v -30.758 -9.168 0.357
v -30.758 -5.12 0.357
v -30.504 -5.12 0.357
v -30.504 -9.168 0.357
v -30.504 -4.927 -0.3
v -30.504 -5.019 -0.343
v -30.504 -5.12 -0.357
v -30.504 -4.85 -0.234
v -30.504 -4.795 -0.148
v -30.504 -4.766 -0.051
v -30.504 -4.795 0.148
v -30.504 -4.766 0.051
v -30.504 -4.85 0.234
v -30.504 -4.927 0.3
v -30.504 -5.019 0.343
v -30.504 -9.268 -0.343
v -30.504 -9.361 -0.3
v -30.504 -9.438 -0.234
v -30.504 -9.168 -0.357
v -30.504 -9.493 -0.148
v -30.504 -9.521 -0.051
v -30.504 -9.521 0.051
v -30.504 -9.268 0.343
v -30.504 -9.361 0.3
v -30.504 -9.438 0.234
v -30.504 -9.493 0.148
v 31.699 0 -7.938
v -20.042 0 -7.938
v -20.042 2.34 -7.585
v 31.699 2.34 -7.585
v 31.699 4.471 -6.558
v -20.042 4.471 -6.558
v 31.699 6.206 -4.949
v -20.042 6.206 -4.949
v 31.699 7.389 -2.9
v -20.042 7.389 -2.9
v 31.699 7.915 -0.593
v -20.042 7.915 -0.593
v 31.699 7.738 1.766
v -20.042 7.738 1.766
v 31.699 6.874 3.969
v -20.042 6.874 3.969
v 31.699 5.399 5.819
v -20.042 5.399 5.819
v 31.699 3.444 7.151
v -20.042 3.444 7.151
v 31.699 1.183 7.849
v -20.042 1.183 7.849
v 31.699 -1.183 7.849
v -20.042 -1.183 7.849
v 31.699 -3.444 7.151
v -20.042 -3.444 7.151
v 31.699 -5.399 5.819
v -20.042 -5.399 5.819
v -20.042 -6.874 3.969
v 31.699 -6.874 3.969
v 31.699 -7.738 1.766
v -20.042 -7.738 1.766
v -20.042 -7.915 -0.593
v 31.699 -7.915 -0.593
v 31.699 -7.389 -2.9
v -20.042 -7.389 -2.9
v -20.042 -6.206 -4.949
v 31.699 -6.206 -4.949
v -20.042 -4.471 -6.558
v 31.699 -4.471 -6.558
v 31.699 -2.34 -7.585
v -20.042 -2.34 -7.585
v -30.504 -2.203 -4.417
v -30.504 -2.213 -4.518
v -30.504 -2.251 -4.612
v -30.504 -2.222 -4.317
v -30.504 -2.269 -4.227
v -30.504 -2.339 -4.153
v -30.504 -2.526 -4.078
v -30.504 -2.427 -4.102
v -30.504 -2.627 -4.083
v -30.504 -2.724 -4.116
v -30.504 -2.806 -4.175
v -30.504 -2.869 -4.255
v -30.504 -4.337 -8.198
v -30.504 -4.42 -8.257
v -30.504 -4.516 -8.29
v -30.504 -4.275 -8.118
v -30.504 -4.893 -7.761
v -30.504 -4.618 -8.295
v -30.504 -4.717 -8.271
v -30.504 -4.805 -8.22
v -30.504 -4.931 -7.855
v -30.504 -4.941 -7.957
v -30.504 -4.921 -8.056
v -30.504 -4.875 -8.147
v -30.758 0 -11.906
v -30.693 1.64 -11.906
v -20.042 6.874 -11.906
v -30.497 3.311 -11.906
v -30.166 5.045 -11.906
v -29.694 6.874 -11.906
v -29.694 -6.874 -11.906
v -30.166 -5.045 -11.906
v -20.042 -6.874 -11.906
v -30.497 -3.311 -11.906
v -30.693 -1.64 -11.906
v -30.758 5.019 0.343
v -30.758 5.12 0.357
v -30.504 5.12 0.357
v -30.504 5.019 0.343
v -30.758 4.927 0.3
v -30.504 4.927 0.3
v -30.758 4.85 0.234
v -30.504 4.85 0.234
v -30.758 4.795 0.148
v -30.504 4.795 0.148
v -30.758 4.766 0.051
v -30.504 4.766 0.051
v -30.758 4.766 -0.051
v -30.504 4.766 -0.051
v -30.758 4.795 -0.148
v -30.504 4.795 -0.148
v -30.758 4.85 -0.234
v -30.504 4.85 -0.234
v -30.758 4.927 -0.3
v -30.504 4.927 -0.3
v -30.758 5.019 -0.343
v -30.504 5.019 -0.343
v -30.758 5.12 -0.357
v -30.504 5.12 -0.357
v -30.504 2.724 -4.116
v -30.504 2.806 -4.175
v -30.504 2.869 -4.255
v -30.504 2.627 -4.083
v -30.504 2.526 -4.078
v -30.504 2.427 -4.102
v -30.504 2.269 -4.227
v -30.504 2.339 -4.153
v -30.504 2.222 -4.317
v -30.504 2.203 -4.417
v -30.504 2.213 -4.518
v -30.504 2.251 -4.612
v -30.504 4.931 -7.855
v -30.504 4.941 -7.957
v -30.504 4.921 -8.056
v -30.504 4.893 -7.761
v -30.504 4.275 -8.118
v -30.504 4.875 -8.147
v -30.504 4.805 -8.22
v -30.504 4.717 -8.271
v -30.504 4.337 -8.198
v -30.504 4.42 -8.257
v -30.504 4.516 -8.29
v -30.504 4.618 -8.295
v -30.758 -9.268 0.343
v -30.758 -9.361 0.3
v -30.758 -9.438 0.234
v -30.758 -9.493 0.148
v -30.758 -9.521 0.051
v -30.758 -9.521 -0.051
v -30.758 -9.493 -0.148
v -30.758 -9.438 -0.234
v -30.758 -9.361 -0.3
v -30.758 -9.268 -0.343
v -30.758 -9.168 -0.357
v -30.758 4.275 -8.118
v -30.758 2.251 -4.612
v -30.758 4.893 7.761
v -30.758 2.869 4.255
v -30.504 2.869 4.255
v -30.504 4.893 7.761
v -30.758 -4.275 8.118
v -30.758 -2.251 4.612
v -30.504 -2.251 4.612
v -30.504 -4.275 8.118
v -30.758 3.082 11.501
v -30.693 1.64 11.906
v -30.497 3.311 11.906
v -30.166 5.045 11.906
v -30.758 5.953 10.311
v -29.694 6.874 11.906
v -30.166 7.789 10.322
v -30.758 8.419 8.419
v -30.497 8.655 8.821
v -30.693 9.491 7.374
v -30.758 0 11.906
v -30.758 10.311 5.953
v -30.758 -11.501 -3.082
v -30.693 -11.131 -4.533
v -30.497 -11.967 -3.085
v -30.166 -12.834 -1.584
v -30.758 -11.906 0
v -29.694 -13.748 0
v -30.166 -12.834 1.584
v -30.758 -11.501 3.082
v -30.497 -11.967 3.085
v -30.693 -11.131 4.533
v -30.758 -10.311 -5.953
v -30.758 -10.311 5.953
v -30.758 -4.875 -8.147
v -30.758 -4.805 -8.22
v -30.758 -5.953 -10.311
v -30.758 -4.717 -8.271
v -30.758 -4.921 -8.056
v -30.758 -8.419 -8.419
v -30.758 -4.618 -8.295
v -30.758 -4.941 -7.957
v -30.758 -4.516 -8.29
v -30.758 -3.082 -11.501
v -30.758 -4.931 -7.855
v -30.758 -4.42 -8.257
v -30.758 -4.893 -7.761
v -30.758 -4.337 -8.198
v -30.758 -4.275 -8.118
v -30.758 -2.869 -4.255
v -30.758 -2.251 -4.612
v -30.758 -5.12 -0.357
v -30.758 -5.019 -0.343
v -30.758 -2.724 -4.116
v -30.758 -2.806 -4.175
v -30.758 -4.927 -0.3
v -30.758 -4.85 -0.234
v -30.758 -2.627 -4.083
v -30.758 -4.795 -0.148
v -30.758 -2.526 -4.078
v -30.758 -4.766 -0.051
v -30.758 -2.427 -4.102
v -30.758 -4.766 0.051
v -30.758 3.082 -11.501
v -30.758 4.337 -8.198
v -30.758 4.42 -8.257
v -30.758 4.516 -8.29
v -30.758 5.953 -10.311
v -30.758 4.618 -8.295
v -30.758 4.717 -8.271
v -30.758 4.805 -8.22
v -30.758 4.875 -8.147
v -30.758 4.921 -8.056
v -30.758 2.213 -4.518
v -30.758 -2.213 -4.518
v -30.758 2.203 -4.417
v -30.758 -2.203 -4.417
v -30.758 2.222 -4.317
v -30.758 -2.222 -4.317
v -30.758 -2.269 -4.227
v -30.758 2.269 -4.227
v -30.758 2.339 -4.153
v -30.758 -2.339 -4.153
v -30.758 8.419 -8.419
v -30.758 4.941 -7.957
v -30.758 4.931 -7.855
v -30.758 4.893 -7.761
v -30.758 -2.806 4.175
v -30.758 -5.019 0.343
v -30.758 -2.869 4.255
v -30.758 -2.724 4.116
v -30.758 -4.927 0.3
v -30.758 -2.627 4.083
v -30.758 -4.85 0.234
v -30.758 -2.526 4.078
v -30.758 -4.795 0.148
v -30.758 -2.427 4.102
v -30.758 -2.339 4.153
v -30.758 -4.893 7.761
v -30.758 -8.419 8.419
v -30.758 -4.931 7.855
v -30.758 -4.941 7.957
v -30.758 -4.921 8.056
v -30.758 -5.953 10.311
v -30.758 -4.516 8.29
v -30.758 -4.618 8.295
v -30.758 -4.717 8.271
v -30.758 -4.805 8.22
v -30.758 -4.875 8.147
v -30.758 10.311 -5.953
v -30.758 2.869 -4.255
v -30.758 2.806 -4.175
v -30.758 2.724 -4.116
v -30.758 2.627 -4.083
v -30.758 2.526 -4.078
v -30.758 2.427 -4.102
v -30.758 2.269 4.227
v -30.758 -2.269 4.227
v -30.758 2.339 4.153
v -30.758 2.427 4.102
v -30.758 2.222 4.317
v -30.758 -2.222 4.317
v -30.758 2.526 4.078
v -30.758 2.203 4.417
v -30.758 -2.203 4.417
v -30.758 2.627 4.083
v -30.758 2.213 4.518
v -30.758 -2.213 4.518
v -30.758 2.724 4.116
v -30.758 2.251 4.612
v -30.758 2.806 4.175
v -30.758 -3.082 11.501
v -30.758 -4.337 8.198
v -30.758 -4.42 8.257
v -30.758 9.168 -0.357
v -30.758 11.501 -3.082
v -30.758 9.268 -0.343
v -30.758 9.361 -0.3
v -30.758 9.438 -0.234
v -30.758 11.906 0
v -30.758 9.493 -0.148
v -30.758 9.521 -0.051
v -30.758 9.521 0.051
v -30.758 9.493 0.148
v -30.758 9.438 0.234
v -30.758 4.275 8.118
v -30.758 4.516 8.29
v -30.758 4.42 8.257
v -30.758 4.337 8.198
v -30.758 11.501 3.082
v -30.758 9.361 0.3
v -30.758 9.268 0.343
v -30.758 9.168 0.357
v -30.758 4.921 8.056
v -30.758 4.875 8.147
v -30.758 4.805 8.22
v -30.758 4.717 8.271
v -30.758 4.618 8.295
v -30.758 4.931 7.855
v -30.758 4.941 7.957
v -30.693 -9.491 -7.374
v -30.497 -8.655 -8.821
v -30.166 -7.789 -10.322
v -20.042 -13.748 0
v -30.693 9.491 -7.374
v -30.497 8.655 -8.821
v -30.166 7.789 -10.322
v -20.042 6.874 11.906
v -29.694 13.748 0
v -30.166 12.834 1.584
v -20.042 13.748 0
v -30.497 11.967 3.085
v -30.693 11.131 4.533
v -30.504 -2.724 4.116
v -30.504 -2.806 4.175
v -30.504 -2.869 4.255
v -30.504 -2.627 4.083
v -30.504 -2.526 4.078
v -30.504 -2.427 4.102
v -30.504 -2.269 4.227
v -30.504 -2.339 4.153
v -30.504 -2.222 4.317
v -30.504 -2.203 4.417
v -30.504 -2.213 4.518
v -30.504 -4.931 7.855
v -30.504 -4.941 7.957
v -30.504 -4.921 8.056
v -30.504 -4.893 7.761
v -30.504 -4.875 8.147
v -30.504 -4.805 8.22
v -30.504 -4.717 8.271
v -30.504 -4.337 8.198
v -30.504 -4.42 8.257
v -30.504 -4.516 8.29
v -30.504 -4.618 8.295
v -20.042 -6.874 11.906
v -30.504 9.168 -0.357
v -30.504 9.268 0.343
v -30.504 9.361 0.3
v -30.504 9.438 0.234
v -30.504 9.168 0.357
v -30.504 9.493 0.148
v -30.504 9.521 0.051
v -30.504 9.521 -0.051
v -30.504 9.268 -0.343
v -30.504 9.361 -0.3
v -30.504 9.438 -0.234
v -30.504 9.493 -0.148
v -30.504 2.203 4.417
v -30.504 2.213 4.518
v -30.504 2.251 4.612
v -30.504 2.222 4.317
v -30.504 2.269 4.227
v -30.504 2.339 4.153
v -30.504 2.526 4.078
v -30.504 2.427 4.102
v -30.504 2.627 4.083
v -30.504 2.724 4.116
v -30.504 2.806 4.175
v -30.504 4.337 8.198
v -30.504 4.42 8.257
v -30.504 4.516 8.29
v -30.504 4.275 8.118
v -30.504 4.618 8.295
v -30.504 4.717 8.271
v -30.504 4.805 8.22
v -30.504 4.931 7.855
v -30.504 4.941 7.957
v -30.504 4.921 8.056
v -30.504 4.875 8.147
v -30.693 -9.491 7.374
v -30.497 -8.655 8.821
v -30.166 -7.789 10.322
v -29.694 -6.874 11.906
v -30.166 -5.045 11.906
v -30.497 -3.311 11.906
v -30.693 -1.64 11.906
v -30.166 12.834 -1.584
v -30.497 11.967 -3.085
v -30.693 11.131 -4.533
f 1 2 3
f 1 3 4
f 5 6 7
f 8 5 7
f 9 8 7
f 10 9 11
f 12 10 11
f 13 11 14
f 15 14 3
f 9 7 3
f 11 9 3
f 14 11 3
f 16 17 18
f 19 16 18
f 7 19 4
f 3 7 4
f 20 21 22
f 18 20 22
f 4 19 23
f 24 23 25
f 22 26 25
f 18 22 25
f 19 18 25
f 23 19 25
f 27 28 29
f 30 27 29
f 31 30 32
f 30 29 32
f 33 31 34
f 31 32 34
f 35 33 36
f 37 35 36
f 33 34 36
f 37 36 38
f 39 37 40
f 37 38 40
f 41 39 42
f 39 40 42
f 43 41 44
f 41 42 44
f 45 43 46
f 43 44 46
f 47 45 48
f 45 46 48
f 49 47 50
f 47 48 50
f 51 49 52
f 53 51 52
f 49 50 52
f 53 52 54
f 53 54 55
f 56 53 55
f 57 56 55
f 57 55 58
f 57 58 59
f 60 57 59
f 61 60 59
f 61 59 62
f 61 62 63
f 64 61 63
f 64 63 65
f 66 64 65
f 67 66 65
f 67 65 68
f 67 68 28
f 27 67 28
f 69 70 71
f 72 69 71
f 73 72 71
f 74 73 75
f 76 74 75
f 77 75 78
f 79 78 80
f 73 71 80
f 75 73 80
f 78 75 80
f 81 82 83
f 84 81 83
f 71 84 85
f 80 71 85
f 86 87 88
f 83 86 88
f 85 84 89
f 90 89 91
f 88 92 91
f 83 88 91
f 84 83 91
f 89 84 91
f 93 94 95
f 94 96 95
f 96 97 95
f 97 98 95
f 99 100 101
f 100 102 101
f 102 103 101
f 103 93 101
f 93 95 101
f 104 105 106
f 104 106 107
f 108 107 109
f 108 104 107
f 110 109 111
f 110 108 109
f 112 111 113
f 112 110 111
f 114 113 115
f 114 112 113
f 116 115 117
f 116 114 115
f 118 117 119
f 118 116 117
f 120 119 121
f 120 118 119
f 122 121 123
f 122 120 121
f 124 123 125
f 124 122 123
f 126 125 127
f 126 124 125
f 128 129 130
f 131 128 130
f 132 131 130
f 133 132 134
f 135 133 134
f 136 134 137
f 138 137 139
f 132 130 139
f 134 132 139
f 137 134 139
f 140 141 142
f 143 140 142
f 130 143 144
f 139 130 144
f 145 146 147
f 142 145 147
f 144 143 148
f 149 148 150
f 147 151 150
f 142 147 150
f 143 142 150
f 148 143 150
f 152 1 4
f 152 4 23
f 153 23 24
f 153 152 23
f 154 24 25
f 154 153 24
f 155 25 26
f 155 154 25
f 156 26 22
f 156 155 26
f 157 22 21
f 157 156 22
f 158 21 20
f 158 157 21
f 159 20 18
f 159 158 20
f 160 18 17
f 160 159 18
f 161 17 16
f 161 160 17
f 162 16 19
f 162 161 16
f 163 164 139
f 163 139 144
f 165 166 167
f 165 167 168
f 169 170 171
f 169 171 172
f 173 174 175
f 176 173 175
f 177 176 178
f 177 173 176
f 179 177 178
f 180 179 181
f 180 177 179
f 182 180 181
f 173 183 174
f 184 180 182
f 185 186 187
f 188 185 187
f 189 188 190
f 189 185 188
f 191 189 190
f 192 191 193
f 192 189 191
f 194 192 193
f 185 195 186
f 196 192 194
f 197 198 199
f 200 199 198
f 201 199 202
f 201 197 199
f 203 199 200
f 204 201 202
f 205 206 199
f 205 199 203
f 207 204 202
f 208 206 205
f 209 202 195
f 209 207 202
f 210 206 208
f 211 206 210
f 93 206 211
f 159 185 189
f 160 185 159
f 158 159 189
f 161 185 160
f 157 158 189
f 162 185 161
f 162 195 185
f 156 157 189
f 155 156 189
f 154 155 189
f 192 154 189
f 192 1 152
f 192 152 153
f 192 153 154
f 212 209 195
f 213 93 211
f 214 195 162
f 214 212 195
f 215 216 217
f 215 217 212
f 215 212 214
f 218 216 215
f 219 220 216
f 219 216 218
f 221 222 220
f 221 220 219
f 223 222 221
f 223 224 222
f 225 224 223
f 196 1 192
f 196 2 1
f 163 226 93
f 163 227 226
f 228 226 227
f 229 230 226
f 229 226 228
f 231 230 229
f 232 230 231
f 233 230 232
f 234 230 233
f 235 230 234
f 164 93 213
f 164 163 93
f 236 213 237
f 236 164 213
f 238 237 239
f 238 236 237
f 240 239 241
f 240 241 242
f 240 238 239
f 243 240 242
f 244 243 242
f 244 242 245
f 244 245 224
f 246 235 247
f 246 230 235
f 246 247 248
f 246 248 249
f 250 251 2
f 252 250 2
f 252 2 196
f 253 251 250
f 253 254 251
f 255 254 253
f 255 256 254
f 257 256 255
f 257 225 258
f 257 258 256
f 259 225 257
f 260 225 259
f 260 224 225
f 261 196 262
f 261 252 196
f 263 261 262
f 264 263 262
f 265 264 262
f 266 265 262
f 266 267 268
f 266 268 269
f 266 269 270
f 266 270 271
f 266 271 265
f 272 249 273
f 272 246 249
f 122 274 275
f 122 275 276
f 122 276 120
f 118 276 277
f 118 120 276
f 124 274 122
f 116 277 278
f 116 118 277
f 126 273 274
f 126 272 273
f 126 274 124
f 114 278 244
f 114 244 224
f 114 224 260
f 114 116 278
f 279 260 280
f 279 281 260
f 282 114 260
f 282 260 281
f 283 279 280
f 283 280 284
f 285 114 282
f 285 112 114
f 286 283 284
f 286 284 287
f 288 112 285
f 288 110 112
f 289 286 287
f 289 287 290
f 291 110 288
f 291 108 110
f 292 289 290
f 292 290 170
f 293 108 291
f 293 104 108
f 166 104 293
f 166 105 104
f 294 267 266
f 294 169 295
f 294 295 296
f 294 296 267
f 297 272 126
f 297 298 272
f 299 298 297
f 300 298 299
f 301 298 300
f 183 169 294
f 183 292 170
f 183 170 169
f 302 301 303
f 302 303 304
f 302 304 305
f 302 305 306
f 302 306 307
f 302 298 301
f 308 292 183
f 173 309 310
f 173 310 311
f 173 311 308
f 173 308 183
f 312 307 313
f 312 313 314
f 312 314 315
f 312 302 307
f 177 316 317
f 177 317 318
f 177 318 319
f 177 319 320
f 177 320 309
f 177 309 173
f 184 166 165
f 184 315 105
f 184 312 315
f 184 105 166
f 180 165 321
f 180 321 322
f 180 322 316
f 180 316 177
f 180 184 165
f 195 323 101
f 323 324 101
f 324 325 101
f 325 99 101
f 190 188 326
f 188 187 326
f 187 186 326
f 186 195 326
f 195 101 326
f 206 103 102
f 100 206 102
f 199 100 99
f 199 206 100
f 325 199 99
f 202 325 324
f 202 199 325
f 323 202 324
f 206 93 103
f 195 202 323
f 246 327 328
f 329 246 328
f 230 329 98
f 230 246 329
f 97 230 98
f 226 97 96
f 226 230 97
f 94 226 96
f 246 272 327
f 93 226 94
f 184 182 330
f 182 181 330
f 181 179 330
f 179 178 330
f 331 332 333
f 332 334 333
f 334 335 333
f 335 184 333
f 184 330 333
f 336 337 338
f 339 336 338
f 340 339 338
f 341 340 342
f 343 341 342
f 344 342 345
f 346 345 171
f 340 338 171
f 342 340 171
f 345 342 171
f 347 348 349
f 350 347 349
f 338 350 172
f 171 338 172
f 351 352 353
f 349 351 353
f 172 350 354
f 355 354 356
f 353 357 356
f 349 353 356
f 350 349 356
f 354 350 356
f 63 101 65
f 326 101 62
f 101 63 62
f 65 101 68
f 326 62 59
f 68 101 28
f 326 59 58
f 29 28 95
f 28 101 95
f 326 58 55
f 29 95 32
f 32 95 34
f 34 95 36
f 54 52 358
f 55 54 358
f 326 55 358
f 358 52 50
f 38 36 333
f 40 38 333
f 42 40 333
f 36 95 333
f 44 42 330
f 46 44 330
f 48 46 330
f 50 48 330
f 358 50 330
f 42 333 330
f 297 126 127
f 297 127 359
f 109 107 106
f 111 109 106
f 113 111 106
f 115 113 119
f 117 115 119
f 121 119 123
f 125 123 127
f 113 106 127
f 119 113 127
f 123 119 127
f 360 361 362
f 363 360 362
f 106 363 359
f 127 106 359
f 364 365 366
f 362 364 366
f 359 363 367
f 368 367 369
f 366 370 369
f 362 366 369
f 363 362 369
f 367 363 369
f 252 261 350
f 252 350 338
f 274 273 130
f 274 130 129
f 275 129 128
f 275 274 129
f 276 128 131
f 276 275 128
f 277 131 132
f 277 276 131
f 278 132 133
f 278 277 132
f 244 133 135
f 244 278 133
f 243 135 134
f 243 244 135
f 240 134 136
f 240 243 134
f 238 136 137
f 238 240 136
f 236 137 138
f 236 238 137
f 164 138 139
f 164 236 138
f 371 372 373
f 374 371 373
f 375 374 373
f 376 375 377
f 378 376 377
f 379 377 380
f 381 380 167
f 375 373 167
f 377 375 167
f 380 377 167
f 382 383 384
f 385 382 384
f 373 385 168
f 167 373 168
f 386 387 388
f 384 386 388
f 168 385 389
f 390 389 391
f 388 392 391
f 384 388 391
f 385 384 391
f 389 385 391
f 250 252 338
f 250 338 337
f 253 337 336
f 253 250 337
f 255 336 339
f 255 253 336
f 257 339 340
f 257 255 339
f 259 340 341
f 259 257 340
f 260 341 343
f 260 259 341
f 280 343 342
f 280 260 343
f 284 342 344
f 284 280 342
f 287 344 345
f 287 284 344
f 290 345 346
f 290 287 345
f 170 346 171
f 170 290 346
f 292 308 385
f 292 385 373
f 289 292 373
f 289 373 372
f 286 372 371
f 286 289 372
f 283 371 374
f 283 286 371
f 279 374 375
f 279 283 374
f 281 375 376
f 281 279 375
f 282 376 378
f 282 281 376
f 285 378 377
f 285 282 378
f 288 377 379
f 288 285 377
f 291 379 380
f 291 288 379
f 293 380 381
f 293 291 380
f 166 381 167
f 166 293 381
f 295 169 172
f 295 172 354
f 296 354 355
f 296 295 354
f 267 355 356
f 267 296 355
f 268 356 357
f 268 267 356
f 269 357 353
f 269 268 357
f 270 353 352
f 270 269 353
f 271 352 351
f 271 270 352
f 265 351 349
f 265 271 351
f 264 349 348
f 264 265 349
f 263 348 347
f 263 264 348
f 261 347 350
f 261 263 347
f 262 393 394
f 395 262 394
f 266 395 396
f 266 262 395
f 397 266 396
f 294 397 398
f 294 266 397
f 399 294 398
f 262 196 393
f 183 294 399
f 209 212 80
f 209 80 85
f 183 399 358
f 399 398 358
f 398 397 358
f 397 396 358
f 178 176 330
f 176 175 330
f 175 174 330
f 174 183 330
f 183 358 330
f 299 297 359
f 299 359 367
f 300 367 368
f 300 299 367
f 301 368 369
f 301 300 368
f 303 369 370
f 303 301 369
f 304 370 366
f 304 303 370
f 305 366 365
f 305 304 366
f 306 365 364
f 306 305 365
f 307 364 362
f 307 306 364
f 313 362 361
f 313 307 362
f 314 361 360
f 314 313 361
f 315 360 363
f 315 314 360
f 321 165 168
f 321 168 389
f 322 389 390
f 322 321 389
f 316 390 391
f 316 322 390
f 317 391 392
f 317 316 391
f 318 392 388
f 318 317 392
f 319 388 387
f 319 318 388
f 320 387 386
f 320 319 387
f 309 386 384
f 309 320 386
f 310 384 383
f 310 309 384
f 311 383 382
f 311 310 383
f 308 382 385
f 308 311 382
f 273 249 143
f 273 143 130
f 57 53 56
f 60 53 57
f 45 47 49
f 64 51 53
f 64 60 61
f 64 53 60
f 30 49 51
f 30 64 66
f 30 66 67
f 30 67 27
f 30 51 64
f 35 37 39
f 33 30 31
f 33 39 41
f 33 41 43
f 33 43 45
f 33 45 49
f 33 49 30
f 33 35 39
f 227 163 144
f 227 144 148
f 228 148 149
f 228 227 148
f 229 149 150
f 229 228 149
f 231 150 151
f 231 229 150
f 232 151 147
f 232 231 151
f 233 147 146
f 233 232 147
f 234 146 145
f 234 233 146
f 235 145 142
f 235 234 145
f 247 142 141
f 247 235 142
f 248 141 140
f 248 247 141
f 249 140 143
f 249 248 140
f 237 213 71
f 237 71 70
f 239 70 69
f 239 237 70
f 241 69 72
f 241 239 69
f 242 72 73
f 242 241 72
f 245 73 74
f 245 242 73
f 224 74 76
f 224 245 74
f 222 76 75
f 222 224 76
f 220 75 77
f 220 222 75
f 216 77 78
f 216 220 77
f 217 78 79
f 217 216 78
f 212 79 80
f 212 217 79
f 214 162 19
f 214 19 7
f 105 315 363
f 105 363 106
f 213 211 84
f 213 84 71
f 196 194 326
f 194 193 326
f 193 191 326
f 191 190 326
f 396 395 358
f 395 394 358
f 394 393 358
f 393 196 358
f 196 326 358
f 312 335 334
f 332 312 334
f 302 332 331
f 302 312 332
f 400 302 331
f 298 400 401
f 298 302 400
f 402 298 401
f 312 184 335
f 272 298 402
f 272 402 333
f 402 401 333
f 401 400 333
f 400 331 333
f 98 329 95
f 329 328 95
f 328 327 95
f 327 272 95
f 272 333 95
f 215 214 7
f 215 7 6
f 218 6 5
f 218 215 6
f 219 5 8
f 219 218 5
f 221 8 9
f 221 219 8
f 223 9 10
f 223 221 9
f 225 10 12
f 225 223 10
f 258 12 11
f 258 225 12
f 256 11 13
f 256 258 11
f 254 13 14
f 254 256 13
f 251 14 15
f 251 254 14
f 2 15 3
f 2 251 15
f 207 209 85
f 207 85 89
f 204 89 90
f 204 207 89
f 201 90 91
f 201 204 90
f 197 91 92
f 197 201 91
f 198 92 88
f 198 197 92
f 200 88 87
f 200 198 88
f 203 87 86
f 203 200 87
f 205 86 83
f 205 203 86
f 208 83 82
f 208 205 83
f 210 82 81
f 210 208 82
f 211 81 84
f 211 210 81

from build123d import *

# Parameters (mm, degrees)
SKETCH5_R           = 7.9375
BOSS_EXTRUDE3_DEPTH = 50.8
CHAMFER1_SIZE       = 1.731818182
CUT_SWEEP1_PITCH    = 2.309090909
BOSS_EXTRUDE4_DEPTH = 10.715625
SKETCH8_OUTSIDE_W   = 265.784
SKETCH8_OUTSIDE_H   = 269.468
SKETCH8_OUTSIDE_R   = 11.90625
CUT_EXTRUDE3_DEPTH  = 65.147818703
CUT_EXTRUDE3_DRAFT  = -60
CUT_EXTRUDE4_DEPTH  = 0.254
CIRPATTERN1_COUNT   = 6
SKETCH13_R          = 7.9375
BOSS_EXTRUDE5_DEPTH = 51.741567


with BuildPart() as part:
    # Sketch5 → Boss-Extrude3 (new body)
    with BuildSketch(Plane(origin=(30.7578125, 0, 0), x_dir=(0, 0, -1), z_dir=(1, 0, 0))):
        Circle(SKETCH5_R)
    extrude(amount=-BOSS_EXTRUDE3_DEPTH)

    # Chamfer1
    chamfer1_edges = [part.edges().sort_by_distance(p)[0] for p in [
        (30.7578125, 0, 7.9375),
    ]]
    chamfer(chamfer1_edges, length=CHAMFER1_SIZE)

    # Cut-Sweep1: arcs per turn and ends read off the stored shape
    # Cut-Sweep1: the profile of Sketch10 profile screwed along a right-hand helix through 23 turns, 10 arcs to a turn; built about Z, then put on its axis
    cut_sweep1_z = Axis((0, 0, 0), (0, 0, 1))
    cut_sweep1_corners = [(7.9378, 0, 0.000173205), (6.43770146, 0, -0.865909091), (6.43770146, 0, -1.154545455), (7.9378, 0, -2.020627751)]
    with BuildLine(mode=Mode.PRIVATE) as cut_sweep1_profile:
        Line(cut_sweep1_corners[0], cut_sweep1_corners[1])
        Line(cut_sweep1_corners[1], cut_sweep1_corners[2])
        Line(cut_sweep1_corners[2], cut_sweep1_corners[3])
        Line(cut_sweep1_corners[3], cut_sweep1_corners[0])
    cut_sweep1_cap = Face(cut_sweep1_profile.wire())
    cut_sweep1_turn_angles = [0, 18, 36, 54, 72, 90, 108, 126, 144, 162, 180, 198, 216, 234, 252, 270, 288, 306, 324, 342, 360]
    cut_sweep1_turn_weights = [1, 0.9510565162951535, 1, 0.9510565162951535, 1, 0.9510565162951535, 1, 0.9510565162951535, 1, 0.9510565162951535, 1, 0.9510565162951535, 1, 0.9510565162951535, 1, 0.9510565162951535, 1, 0.9510565162951535, 1, 0.9510565162951535, 1]
    cut_sweep1_turn_rails = [Edge.make_bspline([Vector(p[0], p[1], 0).rotate(cut_sweep1_z, cut_sweep1_turn_angles[k]) / cut_sweep1_turn_weights[k] + Vector(0, 0, p[2] + CUT_SWEEP1_PITCH * cut_sweep1_turn_angles[k] / 360) for k in range(21)], [0, 0, 0, 1, 1, 2, 2, 3, 3, 4, 4, 5, 5, 6, 6, 7, 7, 8, 8, 9, 9, 10, 10, 10], 2, cut_sweep1_turn_weights) for p in cut_sweep1_corners]
    cut_sweep1_turn_sides = [Face.make_surface_from_curves(cut_sweep1_turn_rails[p[0]], cut_sweep1_turn_rails[p[1]]) for p in [(0, 1), (1, 2), (2, 3), (3, 0)]]
    cut_sweep1 = Plane(origin=(30.7578125, 0, 0), x_dir=(0, 1, 0), z_dir=(-1, 0, 0)) * Solid(Shell([*[p.moved(Location((0, 0, CUT_SWEEP1_PITCH * i))) for i in range(23) for p in cut_sweep1_turn_sides], cut_sweep1_cap, cut_sweep1_cap.rotate(cut_sweep1_z, 8280).moved(Location((0, 0, CUT_SWEEP1_PITCH * 8280 / 360)))]))
    add(cut_sweep1, mode=Mode.SUBTRACT)

    # Sketch6 → Boss-Extrude4 (add)
    with BuildSketch(Plane.ZY.offset(20.0421875)):
        Polygon((11.90625, 6.874076643), (0, 13.748153285), (-11.90625, 6.874076643), (-11.90625, -6.874076643), (0, -13.748153285), (11.90625, -6.874076643), align=None)
    extrude(amount=BOSS_EXTRUDE4_DEPTH)


with BuildPart() as cut_extrude3_tool:
    # Sketch8 outside → Cut-Extrude3 (with draft: the straight prism first)
    with BuildSketch(Plane.ZY.offset(30.7578125)):
        Rectangle(SKETCH8_OUTSIDE_W, SKETCH8_OUTSIDE_H)
        Circle(SKETCH8_OUTSIDE_R, mode=Mode.SUBTRACT)
    extrude(amount=-CUT_EXTRUDE3_DEPTH)
    # Cut-Extrude3: the draft: its side faces are tilted about the plane it starts from
    cut_extrude3_sides = [cut_extrude3_tool.faces().sort_by_distance(p)[0] for p in [
        (1.816096852, -134.734, 0),
        (1.816096852, 0, 132.892),
        (1.816096852, 134.734, 0),
        (1.816096852, 0, -132.892),
        (1.816096852, 0, -11.90625),
    ]]
    draft(cut_extrude3_sides, Plane.ZY.offset(30.7578125), CUT_EXTRUDE3_DRAFT)


with BuildPart() as part_1:
    add(part.part)

    # Cut-Extrude3: cut by cut_extrude3_tool
    add(cut_extrude3_tool.part, mode=Mode.SUBTRACT)

    # Sketch12 → Cut-Extrude4 (cut)
    with BuildSketch(Plane.ZY.offset(30.7578125)):
        with BuildLine():
            Line((0.3571875, 9.1678125), (0.3571875, 5.1196875))
            ThreePointArc((0.3571875, 5.1196875), (0, 4.7625), (-0.3571875, 5.1196875))
            Line((-0.3571875, 5.1196875), (-0.3571875, 9.1678125))
            ThreePointArc((-0.3571875, 9.1678125), (0, 9.525), (0.3571875, 9.1678125))
        make_face()
    cut_extrude4 = extrude(amount=-CUT_EXTRUDE4_DEPTH, mode=Mode.SUBTRACT)

    # CirPattern1: Cut-Extrude4 ×6 about axis
    cirpattern1_axis = Axis((0, 0, 0), (1, 0, 0))
    for i in range(1, CIRPATTERN1_COUNT):
        add(cut_extrude4.rotate(cirpattern1_axis, i * 360 / CIRPATTERN1_COUNT), mode=Mode.SUBTRACT)

    # Sketch13 → Boss-Extrude5 (add)
    with BuildSketch(Plane(origin=(-20.0421875, 0, 0), x_dir=(0, 0, -1), z_dir=(1, 0, 0))):
        Circle(SKETCH13_R)
    extrude(amount=BOSS_EXTRUDE5_DEPTH)


solid = part_1.part
